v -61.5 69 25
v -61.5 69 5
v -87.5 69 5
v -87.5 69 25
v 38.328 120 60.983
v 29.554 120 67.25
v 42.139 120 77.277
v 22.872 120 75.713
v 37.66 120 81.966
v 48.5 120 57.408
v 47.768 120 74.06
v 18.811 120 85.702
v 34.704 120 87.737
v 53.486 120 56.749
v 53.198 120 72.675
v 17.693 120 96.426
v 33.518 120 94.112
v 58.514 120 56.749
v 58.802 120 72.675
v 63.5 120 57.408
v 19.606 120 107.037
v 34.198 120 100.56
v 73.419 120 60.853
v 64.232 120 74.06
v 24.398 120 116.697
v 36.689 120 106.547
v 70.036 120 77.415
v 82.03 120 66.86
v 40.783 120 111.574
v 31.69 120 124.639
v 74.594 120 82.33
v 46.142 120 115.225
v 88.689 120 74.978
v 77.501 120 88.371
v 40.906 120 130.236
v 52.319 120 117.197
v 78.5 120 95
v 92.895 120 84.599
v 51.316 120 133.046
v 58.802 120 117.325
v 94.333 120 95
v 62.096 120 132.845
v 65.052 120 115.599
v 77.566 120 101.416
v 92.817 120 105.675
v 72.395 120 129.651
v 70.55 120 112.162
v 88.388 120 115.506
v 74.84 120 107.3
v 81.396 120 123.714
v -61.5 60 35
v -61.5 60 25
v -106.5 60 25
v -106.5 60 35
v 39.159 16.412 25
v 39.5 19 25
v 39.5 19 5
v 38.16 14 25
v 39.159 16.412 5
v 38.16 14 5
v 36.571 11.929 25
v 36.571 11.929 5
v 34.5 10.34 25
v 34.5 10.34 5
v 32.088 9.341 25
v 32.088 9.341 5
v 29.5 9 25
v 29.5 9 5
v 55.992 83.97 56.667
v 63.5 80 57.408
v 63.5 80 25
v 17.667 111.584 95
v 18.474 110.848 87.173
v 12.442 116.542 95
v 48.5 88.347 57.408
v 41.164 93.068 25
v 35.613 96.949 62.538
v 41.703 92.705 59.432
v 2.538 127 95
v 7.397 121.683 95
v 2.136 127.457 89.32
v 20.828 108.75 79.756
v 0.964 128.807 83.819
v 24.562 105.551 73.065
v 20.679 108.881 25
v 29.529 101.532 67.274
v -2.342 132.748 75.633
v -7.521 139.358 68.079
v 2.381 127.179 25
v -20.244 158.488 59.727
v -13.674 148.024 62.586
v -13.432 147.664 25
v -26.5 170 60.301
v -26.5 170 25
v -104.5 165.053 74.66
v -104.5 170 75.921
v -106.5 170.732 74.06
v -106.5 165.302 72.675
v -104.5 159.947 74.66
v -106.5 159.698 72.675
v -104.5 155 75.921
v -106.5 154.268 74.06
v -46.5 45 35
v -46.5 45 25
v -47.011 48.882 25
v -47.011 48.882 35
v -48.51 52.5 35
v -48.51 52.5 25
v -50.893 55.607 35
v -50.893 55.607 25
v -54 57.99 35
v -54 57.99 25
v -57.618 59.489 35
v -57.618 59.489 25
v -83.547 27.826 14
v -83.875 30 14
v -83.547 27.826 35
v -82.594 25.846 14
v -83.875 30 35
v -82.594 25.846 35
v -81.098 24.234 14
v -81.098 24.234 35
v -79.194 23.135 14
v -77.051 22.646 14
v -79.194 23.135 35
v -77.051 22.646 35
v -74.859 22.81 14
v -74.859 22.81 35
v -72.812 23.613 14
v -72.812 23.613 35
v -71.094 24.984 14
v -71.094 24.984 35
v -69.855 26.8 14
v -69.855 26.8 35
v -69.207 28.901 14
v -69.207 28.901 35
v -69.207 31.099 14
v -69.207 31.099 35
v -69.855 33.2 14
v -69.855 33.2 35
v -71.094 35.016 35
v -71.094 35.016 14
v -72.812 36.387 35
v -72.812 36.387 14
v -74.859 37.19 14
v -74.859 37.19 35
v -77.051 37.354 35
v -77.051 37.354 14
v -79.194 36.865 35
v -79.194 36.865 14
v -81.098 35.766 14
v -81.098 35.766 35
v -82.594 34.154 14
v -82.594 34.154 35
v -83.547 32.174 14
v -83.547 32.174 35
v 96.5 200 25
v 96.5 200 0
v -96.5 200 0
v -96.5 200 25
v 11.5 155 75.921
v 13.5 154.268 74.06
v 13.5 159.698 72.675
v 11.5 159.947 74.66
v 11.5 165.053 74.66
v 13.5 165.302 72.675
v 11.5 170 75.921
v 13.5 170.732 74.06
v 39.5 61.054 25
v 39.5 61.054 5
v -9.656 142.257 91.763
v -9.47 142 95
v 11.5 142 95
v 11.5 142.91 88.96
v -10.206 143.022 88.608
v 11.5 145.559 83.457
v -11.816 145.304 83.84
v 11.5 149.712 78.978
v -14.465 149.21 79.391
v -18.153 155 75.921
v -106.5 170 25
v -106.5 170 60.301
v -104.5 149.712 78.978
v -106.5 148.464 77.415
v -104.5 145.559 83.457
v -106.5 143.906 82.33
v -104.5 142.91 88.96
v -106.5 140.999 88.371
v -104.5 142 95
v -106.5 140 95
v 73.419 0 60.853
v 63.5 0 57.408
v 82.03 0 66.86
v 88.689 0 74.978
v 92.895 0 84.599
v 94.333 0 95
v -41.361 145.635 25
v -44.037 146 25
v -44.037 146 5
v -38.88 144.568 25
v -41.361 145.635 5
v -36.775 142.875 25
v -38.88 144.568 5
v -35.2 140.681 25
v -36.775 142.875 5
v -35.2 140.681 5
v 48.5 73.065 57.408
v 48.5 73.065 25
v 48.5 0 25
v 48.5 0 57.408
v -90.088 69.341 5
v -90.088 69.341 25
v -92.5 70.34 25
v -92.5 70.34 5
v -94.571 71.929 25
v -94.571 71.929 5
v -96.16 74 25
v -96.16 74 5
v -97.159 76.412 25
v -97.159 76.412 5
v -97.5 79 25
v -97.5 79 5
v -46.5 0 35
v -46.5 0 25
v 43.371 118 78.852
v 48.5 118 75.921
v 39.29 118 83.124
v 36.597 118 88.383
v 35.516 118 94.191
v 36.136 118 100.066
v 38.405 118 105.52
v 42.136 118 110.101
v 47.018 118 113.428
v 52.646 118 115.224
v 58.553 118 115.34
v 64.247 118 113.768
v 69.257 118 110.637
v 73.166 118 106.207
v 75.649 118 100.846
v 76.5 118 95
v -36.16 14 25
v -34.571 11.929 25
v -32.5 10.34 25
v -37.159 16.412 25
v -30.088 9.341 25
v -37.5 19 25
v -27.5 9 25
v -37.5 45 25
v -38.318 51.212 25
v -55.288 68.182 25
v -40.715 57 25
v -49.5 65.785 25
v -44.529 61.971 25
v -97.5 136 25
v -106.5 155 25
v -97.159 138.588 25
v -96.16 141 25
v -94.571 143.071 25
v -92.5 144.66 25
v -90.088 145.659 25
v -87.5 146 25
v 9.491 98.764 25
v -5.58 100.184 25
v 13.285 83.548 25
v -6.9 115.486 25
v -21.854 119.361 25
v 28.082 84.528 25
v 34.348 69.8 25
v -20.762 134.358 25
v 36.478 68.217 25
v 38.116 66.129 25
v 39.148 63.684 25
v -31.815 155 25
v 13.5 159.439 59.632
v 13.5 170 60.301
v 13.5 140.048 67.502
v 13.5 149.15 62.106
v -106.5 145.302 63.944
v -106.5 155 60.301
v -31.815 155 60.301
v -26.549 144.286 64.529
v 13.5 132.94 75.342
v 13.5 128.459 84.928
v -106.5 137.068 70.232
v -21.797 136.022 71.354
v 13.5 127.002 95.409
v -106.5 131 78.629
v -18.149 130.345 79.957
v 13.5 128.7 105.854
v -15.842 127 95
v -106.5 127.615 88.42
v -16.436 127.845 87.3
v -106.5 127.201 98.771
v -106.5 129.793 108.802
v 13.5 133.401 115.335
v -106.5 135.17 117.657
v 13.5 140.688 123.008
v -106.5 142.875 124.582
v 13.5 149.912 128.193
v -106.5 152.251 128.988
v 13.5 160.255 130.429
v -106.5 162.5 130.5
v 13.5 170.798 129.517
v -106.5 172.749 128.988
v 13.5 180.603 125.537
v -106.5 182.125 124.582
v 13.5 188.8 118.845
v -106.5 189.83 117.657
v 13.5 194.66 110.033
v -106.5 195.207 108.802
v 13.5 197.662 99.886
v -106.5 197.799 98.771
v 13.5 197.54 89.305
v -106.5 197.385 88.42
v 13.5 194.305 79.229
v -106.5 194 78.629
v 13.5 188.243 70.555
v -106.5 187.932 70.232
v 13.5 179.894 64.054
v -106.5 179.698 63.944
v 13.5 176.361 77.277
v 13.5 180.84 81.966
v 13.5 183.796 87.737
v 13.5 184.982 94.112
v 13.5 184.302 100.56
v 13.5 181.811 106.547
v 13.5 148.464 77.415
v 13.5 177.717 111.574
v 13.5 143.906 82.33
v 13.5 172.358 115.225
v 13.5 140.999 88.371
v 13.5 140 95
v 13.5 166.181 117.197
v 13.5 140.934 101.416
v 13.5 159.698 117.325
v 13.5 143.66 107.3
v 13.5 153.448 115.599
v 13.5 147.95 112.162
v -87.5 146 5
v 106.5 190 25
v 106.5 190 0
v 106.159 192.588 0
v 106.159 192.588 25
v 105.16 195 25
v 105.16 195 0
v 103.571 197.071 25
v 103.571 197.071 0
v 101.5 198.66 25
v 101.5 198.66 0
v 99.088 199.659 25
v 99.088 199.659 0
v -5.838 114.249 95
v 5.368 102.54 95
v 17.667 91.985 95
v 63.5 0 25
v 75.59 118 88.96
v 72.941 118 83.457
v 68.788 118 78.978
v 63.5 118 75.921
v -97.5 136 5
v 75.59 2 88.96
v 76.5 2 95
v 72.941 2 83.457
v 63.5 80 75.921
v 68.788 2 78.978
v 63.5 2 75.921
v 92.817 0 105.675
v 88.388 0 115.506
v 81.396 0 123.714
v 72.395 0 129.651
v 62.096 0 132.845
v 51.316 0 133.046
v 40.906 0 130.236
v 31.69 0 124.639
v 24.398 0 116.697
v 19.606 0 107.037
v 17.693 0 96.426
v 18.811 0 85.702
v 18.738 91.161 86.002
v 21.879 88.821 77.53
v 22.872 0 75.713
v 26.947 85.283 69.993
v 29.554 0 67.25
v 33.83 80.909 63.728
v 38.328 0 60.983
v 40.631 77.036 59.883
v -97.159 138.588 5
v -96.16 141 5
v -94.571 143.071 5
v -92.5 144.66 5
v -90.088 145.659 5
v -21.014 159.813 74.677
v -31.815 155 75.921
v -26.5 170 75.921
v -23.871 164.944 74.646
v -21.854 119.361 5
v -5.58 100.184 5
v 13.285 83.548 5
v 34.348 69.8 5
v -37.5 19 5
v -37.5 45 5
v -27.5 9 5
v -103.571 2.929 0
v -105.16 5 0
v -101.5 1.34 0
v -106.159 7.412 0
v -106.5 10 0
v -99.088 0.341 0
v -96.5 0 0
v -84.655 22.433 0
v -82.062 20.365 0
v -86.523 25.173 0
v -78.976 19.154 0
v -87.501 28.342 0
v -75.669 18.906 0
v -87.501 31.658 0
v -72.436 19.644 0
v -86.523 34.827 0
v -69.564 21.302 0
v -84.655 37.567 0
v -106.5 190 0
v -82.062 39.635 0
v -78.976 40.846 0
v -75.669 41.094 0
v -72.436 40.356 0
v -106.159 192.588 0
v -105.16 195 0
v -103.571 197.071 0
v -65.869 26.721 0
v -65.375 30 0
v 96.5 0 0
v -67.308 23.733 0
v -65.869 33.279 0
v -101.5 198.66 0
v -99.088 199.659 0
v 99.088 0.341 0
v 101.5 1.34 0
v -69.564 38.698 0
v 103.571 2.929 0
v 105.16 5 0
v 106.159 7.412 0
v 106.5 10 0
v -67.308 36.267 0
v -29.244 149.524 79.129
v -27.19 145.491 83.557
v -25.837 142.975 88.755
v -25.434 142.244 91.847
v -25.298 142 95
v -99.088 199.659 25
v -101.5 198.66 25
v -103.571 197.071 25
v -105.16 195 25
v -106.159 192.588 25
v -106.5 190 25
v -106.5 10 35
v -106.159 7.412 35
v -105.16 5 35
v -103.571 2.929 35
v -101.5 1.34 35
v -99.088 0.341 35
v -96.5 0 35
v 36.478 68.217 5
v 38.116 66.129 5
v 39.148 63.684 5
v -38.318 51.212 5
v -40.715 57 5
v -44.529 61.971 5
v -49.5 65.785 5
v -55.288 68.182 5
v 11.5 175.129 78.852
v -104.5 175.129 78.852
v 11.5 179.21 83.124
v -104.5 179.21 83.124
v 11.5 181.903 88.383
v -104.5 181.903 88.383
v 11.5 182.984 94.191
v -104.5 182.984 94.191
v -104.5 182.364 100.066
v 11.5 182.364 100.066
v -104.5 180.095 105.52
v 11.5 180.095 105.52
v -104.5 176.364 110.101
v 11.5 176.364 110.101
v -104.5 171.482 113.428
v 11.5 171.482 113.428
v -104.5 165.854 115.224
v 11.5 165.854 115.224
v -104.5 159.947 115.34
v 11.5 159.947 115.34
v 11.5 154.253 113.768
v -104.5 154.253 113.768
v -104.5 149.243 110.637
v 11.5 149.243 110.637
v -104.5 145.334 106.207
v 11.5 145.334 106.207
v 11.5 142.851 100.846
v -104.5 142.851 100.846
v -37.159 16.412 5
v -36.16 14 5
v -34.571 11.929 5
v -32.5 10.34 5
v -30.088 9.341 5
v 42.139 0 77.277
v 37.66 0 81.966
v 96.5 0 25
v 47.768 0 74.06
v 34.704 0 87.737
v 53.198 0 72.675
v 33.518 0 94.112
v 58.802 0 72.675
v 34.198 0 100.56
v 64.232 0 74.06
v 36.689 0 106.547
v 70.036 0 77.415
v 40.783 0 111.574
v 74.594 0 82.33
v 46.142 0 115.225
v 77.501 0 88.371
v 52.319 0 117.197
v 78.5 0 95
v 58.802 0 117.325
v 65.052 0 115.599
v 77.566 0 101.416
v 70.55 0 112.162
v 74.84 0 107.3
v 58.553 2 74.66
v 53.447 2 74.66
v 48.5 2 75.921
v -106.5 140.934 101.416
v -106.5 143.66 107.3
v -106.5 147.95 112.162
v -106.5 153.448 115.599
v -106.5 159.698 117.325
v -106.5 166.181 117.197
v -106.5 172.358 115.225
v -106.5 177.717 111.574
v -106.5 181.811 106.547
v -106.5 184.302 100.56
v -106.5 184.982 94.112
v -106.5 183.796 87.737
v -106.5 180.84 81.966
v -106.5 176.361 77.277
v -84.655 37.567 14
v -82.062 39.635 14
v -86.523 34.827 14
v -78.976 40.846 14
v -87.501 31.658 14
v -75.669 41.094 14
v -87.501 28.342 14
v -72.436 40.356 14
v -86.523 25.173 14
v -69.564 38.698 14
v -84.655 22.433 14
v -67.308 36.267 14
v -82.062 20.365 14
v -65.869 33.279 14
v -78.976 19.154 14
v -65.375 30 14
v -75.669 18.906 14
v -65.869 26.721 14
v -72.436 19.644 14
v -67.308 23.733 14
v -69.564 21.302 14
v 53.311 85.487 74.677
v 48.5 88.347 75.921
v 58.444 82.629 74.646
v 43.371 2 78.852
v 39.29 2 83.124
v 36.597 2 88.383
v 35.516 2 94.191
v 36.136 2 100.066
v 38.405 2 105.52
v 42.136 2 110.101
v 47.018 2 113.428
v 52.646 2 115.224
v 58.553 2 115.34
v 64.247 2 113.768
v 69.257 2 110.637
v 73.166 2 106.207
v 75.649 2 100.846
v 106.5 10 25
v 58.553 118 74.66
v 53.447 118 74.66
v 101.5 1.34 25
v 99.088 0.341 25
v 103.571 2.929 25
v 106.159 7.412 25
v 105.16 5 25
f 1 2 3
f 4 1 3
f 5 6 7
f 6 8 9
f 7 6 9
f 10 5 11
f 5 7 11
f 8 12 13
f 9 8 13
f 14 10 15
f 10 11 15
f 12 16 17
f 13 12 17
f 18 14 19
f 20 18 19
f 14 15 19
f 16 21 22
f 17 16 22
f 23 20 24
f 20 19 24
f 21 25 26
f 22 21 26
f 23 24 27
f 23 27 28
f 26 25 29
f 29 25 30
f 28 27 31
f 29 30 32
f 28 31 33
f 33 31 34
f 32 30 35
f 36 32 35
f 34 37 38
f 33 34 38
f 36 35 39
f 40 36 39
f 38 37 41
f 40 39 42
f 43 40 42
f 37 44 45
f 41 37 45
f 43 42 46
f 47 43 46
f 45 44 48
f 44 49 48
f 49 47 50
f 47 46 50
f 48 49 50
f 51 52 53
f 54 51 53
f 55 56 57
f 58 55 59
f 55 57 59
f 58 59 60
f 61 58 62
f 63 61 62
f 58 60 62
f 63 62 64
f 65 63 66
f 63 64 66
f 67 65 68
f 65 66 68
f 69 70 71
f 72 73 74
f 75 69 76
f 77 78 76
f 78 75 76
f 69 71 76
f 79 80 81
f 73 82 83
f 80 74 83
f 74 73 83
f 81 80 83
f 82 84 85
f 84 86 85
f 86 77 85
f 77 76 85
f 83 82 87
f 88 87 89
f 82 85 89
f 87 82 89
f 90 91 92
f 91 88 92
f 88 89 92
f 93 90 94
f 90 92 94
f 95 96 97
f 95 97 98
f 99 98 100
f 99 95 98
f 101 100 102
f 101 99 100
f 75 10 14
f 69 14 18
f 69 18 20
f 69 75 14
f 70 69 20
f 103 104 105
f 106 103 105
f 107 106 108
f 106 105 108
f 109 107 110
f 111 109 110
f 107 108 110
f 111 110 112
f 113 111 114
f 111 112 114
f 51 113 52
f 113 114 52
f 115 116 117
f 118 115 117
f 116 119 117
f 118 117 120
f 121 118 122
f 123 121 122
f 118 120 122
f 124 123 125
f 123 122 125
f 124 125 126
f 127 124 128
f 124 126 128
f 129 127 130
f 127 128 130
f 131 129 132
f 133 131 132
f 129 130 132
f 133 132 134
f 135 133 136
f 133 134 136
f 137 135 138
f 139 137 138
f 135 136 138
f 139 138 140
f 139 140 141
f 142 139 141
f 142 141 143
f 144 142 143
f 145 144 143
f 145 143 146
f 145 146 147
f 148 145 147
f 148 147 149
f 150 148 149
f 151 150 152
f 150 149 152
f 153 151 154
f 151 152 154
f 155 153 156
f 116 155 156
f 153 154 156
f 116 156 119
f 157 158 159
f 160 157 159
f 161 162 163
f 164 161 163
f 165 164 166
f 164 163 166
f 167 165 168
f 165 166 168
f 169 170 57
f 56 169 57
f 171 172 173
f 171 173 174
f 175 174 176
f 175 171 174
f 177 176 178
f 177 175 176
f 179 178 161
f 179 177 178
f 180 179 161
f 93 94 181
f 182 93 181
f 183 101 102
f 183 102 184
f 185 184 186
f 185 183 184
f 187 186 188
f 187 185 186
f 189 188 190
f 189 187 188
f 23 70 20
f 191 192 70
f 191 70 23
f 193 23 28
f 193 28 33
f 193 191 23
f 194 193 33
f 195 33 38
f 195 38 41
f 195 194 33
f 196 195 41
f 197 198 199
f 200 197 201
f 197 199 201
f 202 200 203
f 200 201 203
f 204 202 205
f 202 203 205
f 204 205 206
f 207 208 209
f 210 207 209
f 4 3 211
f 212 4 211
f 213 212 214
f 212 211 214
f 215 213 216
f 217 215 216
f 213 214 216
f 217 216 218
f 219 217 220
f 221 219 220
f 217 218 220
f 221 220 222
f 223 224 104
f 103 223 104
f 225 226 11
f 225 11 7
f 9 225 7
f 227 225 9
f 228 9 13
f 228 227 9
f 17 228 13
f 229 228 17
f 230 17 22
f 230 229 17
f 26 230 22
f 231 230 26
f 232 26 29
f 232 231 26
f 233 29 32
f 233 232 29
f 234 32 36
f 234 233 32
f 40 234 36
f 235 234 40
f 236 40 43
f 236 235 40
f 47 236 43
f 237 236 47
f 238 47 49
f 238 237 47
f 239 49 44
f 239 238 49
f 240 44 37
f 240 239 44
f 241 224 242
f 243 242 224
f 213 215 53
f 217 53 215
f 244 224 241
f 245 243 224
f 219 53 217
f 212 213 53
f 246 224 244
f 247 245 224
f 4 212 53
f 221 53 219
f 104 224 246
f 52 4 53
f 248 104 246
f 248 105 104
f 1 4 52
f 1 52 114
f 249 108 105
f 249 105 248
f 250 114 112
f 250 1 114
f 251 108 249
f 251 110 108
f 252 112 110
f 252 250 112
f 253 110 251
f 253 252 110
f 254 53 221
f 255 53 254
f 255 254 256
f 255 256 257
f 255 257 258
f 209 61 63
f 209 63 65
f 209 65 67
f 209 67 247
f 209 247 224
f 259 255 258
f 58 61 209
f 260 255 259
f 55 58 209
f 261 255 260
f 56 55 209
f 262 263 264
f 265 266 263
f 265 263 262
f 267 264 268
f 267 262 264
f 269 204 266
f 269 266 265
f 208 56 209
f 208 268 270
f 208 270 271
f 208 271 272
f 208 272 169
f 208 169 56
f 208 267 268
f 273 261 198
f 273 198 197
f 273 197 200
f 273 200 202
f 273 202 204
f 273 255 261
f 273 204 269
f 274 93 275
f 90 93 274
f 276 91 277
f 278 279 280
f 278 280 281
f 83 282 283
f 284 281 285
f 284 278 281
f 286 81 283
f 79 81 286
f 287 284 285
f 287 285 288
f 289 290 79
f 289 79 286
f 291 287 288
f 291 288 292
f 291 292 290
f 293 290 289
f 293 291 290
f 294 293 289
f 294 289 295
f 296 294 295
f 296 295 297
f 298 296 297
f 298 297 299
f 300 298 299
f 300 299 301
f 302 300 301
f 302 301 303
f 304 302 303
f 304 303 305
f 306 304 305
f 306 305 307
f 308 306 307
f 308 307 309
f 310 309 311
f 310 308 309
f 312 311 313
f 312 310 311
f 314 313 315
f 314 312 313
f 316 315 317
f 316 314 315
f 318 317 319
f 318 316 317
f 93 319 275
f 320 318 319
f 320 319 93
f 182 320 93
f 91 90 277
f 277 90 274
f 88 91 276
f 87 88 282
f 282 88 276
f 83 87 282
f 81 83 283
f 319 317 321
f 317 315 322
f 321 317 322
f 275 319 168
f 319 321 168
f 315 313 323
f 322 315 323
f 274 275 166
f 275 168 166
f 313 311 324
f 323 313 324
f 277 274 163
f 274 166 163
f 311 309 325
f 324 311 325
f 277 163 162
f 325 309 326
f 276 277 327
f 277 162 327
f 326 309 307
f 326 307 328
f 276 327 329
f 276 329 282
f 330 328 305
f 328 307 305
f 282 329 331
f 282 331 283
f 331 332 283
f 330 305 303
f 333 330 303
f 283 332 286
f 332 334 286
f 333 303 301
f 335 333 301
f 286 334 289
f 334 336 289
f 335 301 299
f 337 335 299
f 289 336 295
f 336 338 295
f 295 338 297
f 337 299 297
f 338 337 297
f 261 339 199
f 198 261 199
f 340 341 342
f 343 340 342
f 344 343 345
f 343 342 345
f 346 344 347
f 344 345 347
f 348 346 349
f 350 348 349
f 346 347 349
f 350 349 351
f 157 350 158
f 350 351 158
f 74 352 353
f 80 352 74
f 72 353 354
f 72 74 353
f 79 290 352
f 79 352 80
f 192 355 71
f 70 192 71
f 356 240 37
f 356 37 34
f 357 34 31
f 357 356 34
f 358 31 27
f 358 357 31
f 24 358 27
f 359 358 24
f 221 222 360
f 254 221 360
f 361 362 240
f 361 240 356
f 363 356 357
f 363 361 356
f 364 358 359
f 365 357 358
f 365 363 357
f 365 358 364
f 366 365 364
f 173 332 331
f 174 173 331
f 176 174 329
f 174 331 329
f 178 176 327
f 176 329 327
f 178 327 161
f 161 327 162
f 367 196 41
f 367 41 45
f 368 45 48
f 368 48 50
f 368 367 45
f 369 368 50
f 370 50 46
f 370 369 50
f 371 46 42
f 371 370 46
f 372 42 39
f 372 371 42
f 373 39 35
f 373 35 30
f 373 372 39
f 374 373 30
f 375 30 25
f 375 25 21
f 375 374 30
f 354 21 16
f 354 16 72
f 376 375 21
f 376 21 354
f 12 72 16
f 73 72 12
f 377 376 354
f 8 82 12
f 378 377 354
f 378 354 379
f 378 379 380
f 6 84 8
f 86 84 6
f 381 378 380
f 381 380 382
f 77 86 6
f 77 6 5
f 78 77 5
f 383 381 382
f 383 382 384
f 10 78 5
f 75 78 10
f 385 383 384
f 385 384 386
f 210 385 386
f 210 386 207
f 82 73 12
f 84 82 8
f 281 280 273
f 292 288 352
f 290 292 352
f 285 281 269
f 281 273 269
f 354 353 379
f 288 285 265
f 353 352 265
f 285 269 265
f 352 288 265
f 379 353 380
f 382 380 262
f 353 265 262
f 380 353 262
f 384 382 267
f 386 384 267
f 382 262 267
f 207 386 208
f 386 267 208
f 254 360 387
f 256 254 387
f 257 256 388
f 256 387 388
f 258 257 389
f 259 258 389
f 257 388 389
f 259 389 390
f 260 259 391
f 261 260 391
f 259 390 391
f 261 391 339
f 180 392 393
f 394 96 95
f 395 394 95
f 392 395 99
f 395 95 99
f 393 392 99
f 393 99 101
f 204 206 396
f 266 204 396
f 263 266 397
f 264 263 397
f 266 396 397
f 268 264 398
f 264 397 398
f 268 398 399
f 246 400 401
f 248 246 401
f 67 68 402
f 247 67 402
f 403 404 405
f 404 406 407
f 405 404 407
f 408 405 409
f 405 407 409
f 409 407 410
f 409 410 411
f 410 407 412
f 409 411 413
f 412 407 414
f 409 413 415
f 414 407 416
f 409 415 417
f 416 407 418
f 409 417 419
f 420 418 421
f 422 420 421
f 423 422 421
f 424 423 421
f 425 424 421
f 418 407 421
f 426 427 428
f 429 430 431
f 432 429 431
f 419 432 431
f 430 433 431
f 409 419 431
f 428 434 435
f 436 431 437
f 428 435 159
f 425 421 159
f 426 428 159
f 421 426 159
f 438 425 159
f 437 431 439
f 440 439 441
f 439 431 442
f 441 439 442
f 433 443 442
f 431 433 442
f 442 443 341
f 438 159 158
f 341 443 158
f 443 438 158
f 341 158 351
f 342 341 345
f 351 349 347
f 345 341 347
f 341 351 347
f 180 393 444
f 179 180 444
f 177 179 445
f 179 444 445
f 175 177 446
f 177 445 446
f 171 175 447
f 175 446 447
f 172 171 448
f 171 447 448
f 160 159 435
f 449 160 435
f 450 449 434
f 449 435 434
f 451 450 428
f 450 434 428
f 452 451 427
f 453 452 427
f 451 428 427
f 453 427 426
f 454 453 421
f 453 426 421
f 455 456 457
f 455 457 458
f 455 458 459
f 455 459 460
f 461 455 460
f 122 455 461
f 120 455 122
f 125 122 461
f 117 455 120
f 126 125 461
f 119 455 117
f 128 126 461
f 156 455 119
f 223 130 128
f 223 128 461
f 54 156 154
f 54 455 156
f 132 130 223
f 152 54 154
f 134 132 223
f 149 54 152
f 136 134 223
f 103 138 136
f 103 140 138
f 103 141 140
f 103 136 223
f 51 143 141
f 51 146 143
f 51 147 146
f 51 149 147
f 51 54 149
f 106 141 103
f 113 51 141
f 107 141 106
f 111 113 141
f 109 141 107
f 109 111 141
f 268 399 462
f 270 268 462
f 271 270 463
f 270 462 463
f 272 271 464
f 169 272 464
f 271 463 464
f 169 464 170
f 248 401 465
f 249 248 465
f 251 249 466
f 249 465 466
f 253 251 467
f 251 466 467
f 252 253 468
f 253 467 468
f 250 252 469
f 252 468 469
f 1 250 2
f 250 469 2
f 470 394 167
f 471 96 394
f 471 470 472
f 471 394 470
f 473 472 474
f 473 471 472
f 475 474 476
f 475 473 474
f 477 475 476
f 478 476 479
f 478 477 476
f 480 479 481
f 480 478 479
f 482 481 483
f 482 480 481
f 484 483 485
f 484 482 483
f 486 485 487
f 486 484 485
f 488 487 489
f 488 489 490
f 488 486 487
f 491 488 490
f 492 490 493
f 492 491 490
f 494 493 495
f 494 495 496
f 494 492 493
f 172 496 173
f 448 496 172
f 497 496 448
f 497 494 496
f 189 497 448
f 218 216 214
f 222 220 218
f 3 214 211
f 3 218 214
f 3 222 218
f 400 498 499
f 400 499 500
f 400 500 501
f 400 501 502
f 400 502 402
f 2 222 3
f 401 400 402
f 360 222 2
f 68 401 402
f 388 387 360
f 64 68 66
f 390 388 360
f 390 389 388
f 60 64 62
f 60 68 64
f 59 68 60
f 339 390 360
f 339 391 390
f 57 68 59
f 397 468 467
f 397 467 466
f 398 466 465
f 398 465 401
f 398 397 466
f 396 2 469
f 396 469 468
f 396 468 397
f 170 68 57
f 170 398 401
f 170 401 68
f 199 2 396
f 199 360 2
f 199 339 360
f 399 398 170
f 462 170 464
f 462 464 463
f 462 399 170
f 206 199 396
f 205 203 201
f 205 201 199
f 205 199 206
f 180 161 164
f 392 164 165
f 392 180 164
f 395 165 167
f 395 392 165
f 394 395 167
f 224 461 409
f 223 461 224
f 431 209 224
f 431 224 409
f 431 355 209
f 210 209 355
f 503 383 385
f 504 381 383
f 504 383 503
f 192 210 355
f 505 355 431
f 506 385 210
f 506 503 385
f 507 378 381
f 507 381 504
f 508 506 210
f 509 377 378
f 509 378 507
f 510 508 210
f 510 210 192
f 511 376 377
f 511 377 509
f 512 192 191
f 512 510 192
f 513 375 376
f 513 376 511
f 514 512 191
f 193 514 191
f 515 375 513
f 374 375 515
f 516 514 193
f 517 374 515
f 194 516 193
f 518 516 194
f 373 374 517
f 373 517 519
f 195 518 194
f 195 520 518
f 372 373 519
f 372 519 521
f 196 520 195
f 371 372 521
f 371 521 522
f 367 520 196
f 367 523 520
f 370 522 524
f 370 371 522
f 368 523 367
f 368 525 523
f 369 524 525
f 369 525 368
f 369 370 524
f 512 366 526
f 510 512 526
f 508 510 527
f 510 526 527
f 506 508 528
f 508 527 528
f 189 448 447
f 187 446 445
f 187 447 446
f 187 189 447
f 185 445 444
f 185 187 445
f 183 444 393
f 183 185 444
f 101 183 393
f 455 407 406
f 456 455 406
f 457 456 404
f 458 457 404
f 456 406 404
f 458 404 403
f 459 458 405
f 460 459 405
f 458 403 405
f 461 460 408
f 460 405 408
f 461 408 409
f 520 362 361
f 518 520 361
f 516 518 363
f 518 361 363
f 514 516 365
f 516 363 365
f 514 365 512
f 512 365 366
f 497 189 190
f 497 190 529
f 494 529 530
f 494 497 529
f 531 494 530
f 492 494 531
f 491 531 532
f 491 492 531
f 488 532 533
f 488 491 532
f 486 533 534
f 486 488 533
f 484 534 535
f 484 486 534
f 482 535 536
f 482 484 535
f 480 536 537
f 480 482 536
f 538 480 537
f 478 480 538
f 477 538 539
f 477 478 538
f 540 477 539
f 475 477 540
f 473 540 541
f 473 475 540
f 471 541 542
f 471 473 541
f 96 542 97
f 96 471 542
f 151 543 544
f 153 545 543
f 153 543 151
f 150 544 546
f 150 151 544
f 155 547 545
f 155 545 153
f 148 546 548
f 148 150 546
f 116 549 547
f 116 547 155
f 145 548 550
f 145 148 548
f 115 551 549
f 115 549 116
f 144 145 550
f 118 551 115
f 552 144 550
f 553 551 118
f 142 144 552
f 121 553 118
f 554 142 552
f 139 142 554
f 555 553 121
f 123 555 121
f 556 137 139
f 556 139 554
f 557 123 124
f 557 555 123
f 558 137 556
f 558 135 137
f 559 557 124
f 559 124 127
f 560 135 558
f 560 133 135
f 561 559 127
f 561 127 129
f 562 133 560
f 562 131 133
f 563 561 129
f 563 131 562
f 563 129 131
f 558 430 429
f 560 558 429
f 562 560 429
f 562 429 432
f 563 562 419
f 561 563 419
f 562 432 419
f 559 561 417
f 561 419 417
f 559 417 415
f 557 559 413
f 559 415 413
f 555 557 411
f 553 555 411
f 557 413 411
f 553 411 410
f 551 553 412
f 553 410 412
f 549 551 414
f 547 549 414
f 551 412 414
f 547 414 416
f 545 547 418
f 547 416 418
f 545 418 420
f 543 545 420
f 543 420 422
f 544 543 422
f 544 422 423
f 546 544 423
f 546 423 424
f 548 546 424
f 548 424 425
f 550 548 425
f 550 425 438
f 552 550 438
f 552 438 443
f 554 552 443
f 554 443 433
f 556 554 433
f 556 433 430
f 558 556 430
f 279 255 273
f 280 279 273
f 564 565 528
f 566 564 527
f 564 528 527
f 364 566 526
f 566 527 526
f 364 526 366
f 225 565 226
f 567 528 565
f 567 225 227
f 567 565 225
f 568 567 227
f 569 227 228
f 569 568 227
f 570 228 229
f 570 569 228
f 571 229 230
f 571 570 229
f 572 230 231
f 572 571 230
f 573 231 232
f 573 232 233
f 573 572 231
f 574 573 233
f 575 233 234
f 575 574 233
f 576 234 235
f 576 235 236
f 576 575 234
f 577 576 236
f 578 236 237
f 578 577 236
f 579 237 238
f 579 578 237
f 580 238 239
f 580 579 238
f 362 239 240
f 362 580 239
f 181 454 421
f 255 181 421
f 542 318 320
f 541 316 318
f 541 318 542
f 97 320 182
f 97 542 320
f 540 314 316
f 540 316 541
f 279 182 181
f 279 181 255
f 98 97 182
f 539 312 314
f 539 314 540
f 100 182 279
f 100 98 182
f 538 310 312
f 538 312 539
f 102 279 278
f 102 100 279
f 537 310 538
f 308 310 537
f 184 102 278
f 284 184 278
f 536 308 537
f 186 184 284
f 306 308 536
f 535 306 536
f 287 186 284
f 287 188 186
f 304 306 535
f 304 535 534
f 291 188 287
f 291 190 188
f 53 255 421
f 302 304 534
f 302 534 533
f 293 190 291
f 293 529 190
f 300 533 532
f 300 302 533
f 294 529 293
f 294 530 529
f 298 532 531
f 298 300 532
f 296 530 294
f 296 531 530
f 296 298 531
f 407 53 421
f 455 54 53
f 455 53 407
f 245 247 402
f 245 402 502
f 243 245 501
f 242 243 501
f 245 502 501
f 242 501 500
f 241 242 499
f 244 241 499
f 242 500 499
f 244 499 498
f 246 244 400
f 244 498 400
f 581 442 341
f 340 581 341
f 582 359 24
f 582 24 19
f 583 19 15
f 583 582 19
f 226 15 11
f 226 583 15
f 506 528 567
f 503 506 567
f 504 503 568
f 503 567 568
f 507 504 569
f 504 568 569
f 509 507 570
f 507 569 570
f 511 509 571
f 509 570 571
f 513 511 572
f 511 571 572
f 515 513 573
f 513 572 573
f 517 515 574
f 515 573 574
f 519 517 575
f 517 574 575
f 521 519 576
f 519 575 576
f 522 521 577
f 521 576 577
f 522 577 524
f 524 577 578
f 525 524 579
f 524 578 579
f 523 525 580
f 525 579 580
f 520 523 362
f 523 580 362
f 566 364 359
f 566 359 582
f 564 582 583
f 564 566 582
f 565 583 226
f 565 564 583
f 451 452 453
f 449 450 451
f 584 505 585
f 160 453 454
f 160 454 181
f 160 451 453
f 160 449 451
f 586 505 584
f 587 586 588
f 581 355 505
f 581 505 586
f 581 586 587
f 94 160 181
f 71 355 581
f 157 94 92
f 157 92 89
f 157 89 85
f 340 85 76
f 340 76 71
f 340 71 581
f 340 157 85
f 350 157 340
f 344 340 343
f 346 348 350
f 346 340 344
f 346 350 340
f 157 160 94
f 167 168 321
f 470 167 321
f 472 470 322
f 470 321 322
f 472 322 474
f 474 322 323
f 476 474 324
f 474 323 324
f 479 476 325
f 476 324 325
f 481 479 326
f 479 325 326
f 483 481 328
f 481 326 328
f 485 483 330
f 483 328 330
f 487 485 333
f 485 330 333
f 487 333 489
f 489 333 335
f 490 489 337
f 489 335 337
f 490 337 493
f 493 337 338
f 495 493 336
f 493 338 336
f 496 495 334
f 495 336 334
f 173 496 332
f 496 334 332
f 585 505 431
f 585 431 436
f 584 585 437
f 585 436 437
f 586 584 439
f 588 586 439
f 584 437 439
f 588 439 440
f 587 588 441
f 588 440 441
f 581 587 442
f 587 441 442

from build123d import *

# Parameters (mm, degrees)
F1_DEPTH       = 35
F2_DEPTH       = 25
F3_DEPTH       = 5
F4_DEPTH       = 95
F5_D           = 14.75
F5_CBORE_D     = 22.25
F5_CBORE_DEPTH = 14
F6_DEPTH       = 25
F8_DEPTH       = 120
F9_DEPTH       = 120
F11_DEPTH      = 120
F12_DEPTH      = 120
F13_SIZE       = 2


with BuildPart() as f1:
    # F0 (on Top) → F1 (new body)
    with BuildSketch(Plane.XY):
        with BuildLine():
            ThreePointArc((-106.5, 10), (-103.5710678119, 2.9289321881), (-96.5, 0))
            Line((-96.5, 0), (-46.5, 0))
            Line((-46.5, 0), (-46.5, 45))
            ThreePointArc((-46.5, 45), (-50.8933982822, 55.6066017178), (-61.5, 60))
            Line((-61.5, 60), (-106.5, 60))
            Line((-106.5, 60), (-106.5, 10))
        make_face()
    extrude(amount=F1_DEPTH)

    # F0 (on Top) → F2 (join)
    with BuildSketch(Plane.XY):
        with BuildLine():
            Line((-46.5, 45), (-46.5, 0))
            Line((-46.5, 0), (48.5, 0))
            Line((48.5, 0), (48.5, 9))
            Line((48.5, 9), (48.5, 73.0645805597))
            ThreePointArc((48.5, 73.0645805597), (0.9989947663, 106.8341893096), (-31.8154327598, 155))
            Line((-31.8154327598, 155), (-106.5, 155))
            Line((-106.5, 155), (-106.5, 60))
            Line((-106.5, 60), (-61.5, 60))
            ThreePointArc((-61.5, 60), (-50.8933982822, 55.6066017178), (-46.5, 45))
        make_face()
        with BuildLine():
            Line((-61.5, 69), (-87.5, 69))
            ThreePointArc((-87.5, 69), (-94.5710678119, 71.9289321881), (-97.5, 79))
            Line((-97.5, 79), (-97.5, 136))
            ThreePointArc((-97.5, 136), (-94.5710678119, 143.0710678119), (-87.5, 146))
            Line((-87.5, 146), (-44.0372922197, 146))
            ThreePointArc((-44.0372922197, 146), (-38.8802046252, 144.5676395548), (-35.2004786871, 140.6808895084))
            ThreePointArc((-35.2004786871, 140.6808895084), (-5.5795172138, 100.1842682312), (34.3477319863, 69.8001858066))
            ThreePointArc((34.3477319863, 69.8001858066), (38.1161859272, 66.1293498865), (39.5, 61.0537868568))
            Line((39.5, 61.0537868568), (39.5, 19))
            ThreePointArc((39.5, 19), (36.5710678119, 11.9289321881), (29.5, 9))
            Line((29.5, 9), (-27.5, 9))
            ThreePointArc((-27.5, 9), (-34.5710678119, 11.9289321881), (-37.5, 19))
            Line((-37.5, 19), (-37.5, 45))
            ThreePointArc((-37.5, 45), (-44.5294372515, 61.9705627485), (-61.5, 69))
        make_face(mode=Mode.SUBTRACT)
    extrude(amount=F2_DEPTH)

    # F0 (on Top) → F3 (join)
    with BuildSketch(Plane.XY):
        with BuildLine():
            ThreePointArc((-97.5, 79), (-94.5710678119, 71.9289321881), (-87.5, 69))
            Line((-87.5, 69), (-61.5, 69))
            ThreePointArc((-61.5, 69), (-44.5294372515, 61.9705627485), (-37.5, 45))
            Line((-37.5, 45), (-37.5, 19))
            ThreePointArc((-37.5, 19), (-34.5710678119, 11.9289321881), (-27.5, 9))
            Line((-27.5, 9), (29.5, 9))
            ThreePointArc((29.5, 9), (36.5710678119, 11.9289321881), (39.5, 19))
            Line((39.5, 19), (39.5, 61.0537868568))
            ThreePointArc((39.5, 61.0537868568), (38.1161859272, 66.1293498865), (34.3477319863, 69.8001858066))
            ThreePointArc((34.3477319863, 69.8001858066), (-5.5795172138, 100.1842682312), (-35.2004786871, 140.6808895084))
            ThreePointArc((-35.2004786871, 140.6808895084), (-38.8802046252, 144.5676395548), (-44.0372922197, 146))
            Line((-44.0372922197, 146), (-87.5, 146))
            ThreePointArc((-87.5, 146), (-94.5710678119, 143.0710678119), (-97.5, 136))
            Line((-97.5, 136), (-97.5, 79))
        make_face()
    extrude(amount=F3_DEPTH)

    # F0 (on Top) → F4 (join)
    with BuildSketch(Plane.XY):
        with BuildLine():
            Line((48.5, 9), (48.5, 0))
            Line((48.5, 0), (63.5, 0))
            Line((63.5, 0), (63.5, 80))
            ThreePointArc((63.5, 80), (11.2368967619, 117.7368967619), (-26.5, 170))
            Line((-26.5, 170), (-106.5, 170))
            Line((-106.5, 170), (-106.5, 155))
            Line((-106.5, 155), (-31.8154327598, 155))
            ThreePointArc((-31.8154327598, 155), (0.9989947663, 106.8341893096), (48.5, 73.0645805597))
            Line((48.5, 73.0645805597), (48.5, 9))
        make_face()
    extrude(amount=F4_DEPTH)

    # F5 (through all)
    with Locations(Plane(origin=(0, 0, 0), x_dir=(1, 0, 0), z_dir=(0, 0, -1))):
        with Locations((-76.5, -30)):
            CounterBoreHole(F5_D / 2, F5_CBORE_D / 2, F5_CBORE_DEPTH)

    # F0 (on Top) → F6 (join)
    with BuildSketch(Plane.XY):
        with BuildLine():
            Line((63.5, 80), (63.5, 0))
            Line((63.5, 0), (96.5, 0))
            ThreePointArc((96.5, 0), (103.5710678119, 2.9289321881), (106.5, 10))
            Line((106.5, 10), (106.5, 190))
            ThreePointArc((106.5, 190), (103.5710678119, 197.0710678119), (96.5, 200))
            Line((96.5, 200), (-96.5, 200))
            ThreePointArc((-96.5, 200), (-103.5710678119, 197.0710678119), (-106.5, 190))
            Line((-106.5, 190), (-106.5, 170))
            Line((-106.5, 170), (-26.5, 170))
            ThreePointArc((-26.5, 170), (11.2368967619, 117.7368967619), (63.5, 80))
        make_face()
    extrude(amount=F6_DEPTH)

    # F7 (on face) → F8 (cut)
    with BuildSketch(Plane.XZ):
        with BuildLine():
            Line((48.5, 75.9212159717), (48.5, 95))
            Line((48.5, 95), (63.5, 95))
            Line((63.5, 95), (63.5, 75.9212159717))
            ThreePointArc((63.5, 75.9212159717), (72.9410743461, 83.4566036194), (76.5, 95))
            ThreePointArc((76.5, 95), (44.4566036194, 111.9410743461), (48.5, 75.9212159717))
        make_face()
        with BuildLine():
            Line((63.5, 95), (48.5, 95))
            Line((48.5, 95), (48.5, 75.9212159717))
            ThreePointArc((48.5, 75.9212159717), (56, 74.5), (63.5, 75.9212159717))
            Line((63.5, 75.9212159717), (63.5, 95))
        make_face()
    extrude(amount=-F8_DEPTH, mode=Mode.SUBTRACT)

    # F7 (on face) → F9 (join)
    with BuildSketch(Plane.XZ):
        with BuildLine():
            Line((48.5, 57.4075197384), (48.5, 75.9212159717))
            ThreePointArc((48.5, 75.9212159717), (44.4566036194, 111.9410743461), (76.5, 95))
            ThreePointArc((76.5, 95), (72.9410743461, 83.4566036194), (63.5, 75.9212159717))
            Line((63.5, 75.9212159717), (63.5, 57.4075197384))
            ThreePointArc((63.5, 57.4075197384), (85.6390332562, 70.6900785715), (94.333335, 95))
            ThreePointArc((94.333335, 95), (31.6900785715, 124.6390332562), (48.5, 57.4075197384))
        make_face()
        with BuildLine():
            ThreePointArc((63.5, 75.9212159717), (56, 74.5), (48.5, 75.9212159717))
            Line((48.5, 75.9212159717), (48.5, 57.4075197384))
            ThreePointArc((48.5, 57.4075197384), (56, 56.666665), (63.5, 57.4075197384))
            Line((63.5, 57.4075197384), (63.5, 75.9212159717))
        make_face()
    extrude(amount=-F9_DEPTH)

    # F10 (on face) → F11 (cut)
    with BuildSketch(Plane(origin=(-106.5, 0, 0), x_dir=(0, -1, 0), z_dir=(-1, 0, 0))):
        with BuildLine():
            Line((-170, 95), (-155, 95))
            Line((-155, 95), (-155, 75.9212159717))
            ThreePointArc((-155, 75.9212159717), (-145.5589256539, 83.4566036194), (-142, 95))
            ThreePointArc((-142, 95), (-174.0433963806, 111.9410743461), (-170, 75.9212159717))
            Line((-170, 75.9212159717), (-170, 95))
        make_face()
        with BuildLine():
            Line((-155, 75.9212159717), (-155, 95))
            Line((-155, 95), (-170, 95))
            Line((-170, 95), (-170, 75.9212159717))
            ThreePointArc((-170, 75.9212159717), (-162.5, 74.5), (-155, 75.9212159717))
        make_face()
    extrude(amount=-F11_DEPTH, mode=Mode.SUBTRACT)

    # F10 (on face) → F12 (join)
    with BuildSketch(Plane(origin=(-106.5, 0, 0), x_dir=(0, -1, 0), z_dir=(-1, 0, 0))):
        with BuildLine():
            ThreePointArc((-142, 95), (-145.5589256539, 83.4566036194), (-155, 75.9212159717))
            Line((-155, 75.9212159717), (-155, 60.3012968542))
            ThreePointArc((-155, 60.3012968542), (-134.8730204329, 72.7065031904), (-127, 95))
            ThreePointArc((-127, 95), (-184.7934968096, 122.6269795671), (-170, 60.3012968542))
            Line((-170, 60.3012968542), (-170, 75.9212159717))
            ThreePointArc((-170, 75.9212159717), (-174.0433963806, 111.9410743461), (-142, 95))
        make_face()
        with BuildLine():
            Line((-155, 60.3012968542), (-155, 75.9212159717))
            ThreePointArc((-155, 75.9212159717), (-162.5, 74.5), (-170, 75.9212159717))
            Line((-170, 75.9212159717), (-170, 60.3012968542))
            ThreePointArc((-170, 60.3012968542), (-162.5, 59.5), (-155, 60.3012968542))
        make_face()
    extrude(amount=-F12_DEPTH)

    # F13
    f13_edges = [f1.edges().sort_by_distance(p)[0] for p in [
        (35.5, 0, 95),
        (35.5, 120, 95),
        (13.5, 183, 95),
        (-106.5, 162.5, 74.5),
        (-106.5, 145.558926, 83.456604),
        (-106.5, 174.043396, 111.941074),
    ]]
    chamfer(f13_edges, length=F13_SIZE)


solid = f1.part
